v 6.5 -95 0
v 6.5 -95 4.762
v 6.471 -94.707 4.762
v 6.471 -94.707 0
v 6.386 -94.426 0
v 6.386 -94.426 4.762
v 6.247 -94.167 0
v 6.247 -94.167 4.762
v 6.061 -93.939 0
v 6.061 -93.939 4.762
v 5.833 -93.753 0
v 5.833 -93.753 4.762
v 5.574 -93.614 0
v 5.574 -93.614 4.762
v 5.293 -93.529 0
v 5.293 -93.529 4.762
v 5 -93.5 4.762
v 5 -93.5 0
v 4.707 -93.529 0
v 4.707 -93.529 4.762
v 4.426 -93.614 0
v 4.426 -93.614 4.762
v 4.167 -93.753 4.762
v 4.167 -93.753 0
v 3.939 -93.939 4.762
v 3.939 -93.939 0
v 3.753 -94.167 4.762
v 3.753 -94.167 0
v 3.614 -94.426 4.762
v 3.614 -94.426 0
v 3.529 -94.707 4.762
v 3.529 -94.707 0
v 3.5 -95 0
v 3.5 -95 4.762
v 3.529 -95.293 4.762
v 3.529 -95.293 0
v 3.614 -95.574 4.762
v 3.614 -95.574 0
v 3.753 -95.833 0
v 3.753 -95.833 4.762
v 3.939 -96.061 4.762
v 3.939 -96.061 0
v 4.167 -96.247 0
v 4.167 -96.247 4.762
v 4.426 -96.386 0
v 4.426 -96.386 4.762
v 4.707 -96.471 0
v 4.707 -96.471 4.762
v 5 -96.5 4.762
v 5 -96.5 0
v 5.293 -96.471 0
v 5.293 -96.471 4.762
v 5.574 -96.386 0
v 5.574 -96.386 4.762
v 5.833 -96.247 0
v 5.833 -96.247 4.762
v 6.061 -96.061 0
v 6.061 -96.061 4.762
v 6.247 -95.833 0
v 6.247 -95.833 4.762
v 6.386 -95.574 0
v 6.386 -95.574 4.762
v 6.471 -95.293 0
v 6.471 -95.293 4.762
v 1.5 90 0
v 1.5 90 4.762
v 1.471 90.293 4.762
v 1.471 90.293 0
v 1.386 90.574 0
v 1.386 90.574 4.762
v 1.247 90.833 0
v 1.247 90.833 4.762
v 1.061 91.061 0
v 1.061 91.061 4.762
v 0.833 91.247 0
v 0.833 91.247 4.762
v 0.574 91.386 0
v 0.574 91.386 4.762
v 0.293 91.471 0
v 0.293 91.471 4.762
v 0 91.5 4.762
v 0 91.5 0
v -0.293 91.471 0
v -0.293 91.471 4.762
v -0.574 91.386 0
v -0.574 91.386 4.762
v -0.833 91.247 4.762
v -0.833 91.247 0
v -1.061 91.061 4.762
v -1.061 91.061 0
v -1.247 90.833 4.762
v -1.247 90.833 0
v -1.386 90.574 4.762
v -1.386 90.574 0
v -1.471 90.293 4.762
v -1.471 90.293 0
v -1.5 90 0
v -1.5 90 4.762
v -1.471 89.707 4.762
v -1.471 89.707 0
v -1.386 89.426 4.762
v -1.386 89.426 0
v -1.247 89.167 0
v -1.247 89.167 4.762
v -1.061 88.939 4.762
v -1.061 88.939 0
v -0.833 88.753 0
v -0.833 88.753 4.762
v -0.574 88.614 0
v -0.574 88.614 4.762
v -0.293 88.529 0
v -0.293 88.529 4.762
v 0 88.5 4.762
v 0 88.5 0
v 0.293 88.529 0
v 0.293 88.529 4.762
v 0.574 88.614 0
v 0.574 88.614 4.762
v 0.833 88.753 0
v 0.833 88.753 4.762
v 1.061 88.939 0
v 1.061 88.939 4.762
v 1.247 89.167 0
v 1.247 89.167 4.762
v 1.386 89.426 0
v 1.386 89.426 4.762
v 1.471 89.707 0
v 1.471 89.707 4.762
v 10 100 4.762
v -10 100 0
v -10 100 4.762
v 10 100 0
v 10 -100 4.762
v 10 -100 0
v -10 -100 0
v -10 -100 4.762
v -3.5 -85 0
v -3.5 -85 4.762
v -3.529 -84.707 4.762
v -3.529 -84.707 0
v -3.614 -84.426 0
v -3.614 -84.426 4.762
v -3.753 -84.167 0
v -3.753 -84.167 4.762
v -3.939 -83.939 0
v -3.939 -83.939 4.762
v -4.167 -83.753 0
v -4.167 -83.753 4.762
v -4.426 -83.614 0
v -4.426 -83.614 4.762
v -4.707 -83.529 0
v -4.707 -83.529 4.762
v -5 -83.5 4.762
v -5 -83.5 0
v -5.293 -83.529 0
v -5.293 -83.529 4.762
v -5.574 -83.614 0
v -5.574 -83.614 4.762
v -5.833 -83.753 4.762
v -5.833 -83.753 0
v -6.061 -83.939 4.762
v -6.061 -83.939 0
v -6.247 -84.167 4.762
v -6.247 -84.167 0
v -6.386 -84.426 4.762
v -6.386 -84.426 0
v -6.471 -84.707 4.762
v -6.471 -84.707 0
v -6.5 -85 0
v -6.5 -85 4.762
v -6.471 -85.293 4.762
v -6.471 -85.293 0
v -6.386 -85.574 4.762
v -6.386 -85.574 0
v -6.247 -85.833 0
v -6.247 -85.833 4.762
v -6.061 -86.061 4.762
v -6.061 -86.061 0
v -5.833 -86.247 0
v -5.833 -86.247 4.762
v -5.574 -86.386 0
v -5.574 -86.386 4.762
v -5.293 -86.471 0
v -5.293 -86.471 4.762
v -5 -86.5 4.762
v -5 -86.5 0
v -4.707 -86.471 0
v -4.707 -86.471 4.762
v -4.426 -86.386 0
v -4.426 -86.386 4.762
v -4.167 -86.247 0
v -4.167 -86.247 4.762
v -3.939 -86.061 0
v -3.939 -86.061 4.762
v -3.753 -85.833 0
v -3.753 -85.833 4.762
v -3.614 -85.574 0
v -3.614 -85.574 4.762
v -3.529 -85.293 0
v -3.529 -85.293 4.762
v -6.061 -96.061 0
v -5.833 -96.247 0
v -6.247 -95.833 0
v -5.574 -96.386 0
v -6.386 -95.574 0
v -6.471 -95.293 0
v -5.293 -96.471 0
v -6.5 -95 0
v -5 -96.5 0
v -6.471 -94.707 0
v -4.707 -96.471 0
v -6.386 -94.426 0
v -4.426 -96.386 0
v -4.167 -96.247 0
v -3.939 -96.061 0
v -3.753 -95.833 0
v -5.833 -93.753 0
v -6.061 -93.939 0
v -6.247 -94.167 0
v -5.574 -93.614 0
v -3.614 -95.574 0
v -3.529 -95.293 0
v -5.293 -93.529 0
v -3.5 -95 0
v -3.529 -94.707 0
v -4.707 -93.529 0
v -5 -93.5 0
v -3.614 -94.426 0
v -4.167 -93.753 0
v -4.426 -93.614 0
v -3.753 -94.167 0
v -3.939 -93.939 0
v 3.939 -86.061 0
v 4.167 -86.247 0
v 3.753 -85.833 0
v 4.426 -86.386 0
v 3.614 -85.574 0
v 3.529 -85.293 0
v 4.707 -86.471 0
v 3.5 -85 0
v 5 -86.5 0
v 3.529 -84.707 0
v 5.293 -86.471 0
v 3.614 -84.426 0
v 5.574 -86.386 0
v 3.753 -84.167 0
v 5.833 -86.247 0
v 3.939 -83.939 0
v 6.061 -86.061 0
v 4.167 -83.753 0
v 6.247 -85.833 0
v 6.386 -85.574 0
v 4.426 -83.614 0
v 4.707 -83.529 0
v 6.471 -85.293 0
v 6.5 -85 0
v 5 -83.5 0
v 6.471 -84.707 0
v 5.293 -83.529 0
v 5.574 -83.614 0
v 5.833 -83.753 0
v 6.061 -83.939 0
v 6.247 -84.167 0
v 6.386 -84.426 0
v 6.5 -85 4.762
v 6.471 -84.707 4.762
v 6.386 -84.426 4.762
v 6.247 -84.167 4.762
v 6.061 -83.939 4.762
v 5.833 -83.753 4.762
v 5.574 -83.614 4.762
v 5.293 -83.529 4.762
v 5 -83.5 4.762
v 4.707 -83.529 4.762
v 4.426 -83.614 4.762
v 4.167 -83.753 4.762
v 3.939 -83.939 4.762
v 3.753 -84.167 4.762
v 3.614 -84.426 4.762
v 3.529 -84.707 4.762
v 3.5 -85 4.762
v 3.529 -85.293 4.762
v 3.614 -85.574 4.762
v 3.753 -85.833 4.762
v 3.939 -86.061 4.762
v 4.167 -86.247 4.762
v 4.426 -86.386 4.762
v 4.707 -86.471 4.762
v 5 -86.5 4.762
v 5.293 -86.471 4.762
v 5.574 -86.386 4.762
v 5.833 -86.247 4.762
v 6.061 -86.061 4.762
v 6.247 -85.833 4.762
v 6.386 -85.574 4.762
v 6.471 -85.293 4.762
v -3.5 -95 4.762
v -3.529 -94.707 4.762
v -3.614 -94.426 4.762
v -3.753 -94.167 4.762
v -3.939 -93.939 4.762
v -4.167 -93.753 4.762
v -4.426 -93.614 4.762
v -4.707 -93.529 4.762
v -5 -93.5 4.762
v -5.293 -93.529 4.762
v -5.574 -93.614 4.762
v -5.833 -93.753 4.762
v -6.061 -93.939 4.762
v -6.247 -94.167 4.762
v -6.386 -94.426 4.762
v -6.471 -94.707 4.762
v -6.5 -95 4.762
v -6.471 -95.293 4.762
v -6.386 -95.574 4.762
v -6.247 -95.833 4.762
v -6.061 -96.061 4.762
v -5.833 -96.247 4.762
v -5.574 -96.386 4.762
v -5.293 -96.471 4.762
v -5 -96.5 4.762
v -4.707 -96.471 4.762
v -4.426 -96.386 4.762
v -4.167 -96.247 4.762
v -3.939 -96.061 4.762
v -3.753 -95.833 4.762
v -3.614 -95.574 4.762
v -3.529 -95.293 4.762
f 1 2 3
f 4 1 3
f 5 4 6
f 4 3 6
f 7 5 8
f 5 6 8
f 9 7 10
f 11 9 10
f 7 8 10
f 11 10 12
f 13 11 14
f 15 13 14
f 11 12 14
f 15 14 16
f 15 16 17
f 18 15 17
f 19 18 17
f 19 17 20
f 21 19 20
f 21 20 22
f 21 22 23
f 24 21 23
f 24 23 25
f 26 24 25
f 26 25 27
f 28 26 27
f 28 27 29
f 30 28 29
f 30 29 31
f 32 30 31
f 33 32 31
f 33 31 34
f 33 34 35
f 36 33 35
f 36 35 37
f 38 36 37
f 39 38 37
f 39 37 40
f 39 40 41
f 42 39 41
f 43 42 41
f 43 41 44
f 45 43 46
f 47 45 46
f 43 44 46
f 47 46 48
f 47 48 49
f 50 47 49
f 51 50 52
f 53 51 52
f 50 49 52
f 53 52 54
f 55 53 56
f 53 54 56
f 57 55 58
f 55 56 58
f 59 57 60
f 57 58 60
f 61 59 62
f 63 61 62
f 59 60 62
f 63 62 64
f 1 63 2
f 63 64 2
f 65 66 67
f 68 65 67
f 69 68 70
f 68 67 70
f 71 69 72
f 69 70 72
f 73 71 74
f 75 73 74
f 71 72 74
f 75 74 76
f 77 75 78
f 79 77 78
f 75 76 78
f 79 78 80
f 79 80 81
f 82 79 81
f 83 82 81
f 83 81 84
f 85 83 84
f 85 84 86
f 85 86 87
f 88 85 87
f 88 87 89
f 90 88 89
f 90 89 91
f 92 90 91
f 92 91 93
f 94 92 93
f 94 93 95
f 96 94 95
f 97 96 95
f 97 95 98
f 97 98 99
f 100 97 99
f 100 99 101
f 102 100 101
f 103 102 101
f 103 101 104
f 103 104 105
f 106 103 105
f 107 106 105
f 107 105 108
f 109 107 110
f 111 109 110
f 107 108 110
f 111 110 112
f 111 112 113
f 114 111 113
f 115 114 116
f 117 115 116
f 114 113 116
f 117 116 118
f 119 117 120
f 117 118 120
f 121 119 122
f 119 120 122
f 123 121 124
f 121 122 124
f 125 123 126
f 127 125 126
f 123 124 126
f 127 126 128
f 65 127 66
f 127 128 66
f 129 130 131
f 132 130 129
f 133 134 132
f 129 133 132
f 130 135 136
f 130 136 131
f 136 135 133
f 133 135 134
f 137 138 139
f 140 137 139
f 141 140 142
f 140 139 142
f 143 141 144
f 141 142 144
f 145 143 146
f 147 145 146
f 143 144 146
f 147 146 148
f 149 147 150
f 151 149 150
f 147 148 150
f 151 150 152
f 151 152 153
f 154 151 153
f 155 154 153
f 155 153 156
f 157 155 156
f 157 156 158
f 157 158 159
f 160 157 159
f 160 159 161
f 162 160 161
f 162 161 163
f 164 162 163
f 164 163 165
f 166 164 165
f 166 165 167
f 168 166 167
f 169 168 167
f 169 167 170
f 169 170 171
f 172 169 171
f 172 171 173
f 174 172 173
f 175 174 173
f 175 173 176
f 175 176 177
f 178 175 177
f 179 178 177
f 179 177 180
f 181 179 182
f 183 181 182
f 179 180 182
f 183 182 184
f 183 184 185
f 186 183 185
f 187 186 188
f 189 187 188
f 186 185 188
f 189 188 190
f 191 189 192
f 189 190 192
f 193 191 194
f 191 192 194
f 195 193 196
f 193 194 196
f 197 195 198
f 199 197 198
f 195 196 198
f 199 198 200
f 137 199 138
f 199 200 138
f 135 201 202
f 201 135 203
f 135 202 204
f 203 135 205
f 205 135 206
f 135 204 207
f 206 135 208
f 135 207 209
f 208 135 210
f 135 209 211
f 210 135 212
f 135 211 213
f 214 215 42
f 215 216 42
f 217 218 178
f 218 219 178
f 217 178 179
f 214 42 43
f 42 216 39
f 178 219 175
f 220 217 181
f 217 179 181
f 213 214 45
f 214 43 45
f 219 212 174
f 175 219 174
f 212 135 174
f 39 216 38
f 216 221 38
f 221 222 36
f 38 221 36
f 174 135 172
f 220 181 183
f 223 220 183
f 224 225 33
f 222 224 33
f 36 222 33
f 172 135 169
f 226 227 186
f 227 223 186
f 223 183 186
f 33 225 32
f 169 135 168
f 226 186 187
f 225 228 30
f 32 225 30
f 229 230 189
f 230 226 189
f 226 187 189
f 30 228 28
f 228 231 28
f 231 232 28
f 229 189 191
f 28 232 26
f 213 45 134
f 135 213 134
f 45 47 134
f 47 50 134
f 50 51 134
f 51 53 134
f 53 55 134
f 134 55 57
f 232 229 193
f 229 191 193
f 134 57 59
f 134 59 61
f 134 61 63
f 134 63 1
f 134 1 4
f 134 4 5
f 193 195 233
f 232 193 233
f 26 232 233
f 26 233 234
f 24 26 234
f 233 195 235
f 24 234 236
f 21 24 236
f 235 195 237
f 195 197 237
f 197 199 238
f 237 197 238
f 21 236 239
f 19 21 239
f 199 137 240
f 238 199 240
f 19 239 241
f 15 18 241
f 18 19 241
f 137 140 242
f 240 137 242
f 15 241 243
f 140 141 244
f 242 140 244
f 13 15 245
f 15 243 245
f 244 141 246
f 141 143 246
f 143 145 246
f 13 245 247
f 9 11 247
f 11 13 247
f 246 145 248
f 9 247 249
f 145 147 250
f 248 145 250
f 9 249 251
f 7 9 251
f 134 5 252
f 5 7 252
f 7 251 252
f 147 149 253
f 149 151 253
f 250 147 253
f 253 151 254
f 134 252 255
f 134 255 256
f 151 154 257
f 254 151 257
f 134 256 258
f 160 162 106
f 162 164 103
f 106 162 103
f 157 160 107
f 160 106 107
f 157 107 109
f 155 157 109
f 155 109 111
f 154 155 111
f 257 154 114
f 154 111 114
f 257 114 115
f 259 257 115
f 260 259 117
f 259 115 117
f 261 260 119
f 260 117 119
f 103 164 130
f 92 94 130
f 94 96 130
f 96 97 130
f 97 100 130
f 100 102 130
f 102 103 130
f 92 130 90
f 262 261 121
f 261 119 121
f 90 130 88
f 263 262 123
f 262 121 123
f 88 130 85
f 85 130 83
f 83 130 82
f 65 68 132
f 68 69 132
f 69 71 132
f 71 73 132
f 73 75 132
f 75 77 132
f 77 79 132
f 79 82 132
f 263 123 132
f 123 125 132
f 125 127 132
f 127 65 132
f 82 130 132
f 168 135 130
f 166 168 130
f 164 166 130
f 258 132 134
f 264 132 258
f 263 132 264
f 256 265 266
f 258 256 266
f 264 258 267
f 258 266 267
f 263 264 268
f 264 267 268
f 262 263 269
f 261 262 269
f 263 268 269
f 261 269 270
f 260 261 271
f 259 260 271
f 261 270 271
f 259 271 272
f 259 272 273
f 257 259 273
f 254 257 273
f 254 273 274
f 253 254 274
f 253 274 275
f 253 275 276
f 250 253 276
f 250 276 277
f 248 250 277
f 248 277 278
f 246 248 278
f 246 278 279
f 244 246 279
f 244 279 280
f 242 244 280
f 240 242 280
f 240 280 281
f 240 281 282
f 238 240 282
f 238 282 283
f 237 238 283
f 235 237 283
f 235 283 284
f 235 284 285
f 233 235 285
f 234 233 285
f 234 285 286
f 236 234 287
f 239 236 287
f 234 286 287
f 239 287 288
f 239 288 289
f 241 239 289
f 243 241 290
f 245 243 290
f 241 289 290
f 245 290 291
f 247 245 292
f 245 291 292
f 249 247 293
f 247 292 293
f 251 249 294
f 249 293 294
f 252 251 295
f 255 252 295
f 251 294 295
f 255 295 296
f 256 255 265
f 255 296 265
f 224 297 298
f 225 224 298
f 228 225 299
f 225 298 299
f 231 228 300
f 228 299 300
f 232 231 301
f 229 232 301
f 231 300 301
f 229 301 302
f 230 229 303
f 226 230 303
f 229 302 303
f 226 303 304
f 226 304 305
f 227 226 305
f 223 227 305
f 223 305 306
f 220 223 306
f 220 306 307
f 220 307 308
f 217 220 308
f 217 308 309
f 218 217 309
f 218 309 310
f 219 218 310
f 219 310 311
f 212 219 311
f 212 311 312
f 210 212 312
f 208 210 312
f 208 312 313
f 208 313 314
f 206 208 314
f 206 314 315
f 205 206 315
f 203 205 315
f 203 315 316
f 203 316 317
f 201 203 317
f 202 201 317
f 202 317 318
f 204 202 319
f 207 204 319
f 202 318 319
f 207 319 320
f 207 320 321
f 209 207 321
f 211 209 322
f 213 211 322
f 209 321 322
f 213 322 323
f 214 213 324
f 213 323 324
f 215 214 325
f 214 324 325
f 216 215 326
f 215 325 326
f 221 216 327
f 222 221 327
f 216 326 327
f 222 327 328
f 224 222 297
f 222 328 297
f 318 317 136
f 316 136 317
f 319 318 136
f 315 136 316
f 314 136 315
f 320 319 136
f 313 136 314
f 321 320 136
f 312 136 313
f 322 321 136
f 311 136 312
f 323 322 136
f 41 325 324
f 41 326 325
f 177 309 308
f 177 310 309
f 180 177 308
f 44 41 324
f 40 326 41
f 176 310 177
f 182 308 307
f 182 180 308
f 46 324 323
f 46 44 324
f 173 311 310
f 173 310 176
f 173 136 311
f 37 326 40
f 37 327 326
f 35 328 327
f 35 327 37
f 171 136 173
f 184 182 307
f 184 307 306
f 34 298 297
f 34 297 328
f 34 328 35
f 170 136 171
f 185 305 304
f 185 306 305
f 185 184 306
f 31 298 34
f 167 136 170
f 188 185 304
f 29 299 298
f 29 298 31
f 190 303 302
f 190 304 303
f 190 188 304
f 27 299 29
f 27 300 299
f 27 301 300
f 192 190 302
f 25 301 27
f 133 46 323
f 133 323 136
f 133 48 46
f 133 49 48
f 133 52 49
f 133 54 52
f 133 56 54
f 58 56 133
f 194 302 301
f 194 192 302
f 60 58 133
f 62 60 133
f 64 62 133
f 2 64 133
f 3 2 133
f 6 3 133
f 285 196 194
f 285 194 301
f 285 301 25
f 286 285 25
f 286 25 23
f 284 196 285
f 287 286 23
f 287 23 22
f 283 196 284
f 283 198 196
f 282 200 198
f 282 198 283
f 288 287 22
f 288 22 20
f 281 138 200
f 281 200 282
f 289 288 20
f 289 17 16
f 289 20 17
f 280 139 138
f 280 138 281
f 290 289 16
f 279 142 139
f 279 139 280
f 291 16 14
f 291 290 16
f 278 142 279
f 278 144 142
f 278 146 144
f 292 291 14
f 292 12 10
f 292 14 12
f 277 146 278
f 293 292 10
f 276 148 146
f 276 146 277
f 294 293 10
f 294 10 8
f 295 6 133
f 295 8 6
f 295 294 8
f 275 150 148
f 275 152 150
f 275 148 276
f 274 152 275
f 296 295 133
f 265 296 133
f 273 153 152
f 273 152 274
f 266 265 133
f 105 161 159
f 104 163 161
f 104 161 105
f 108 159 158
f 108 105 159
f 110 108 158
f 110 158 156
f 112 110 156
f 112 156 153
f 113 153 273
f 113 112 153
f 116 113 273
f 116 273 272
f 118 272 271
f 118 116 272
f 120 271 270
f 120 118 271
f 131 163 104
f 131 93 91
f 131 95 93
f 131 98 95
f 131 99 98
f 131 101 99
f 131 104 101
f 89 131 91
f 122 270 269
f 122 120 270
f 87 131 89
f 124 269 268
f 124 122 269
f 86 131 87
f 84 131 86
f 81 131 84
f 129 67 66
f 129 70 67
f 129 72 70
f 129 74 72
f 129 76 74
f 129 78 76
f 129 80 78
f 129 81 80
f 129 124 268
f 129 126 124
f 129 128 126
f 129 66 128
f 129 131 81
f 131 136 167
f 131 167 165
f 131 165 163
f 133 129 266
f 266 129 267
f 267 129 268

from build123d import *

# Parameters (mm, degrees)
SKETCH1_W           = 20
SKETCH1_H           = 200
BOSS_EXTRUDE1_DEPTH = 4.7625
SKETCH2_R           = 1.5
CUT_EXTRUDE1_DEPTH  = 101.611537143
SKETCH3_R           = 1.5
CUT_EXTRUDE2_DEPTH  = 101.611537143


with BuildPart() as part:
    # Sketch1 → Boss-Extrude1 (new body)
    with BuildSketch(Plane.XY):
        Rectangle(SKETCH1_W, SKETCH1_H)
    extrude(amount=BOSS_EXTRUDE1_DEPTH)

    # Sketch2 → Cut-Extrude1 (cut, through all)
    with BuildSketch(Plane.XY.offset(4.7625)):
        with Locations((-5, -95)):
            Circle(SKETCH2_R)
        with Locations((5, -95)):
            Circle(SKETCH2_R)
        with Locations((-5, -85)):
            Circle(SKETCH2_R)
        with Locations((5, -85)):
            Circle(SKETCH2_R)
    extrude(amount=-CUT_EXTRUDE1_DEPTH, mode=Mode.SUBTRACT)

    # Sketch3 → Cut-Extrude2 (cut, through all)
    with BuildSketch(Plane.XY.offset(4.7625)):
        with Locations((0, 90)):
            Circle(SKETCH3_R)
    extrude(amount=-CUT_EXTRUDE2_DEPTH, mode=Mode.SUBTRACT)


solid = part.part
